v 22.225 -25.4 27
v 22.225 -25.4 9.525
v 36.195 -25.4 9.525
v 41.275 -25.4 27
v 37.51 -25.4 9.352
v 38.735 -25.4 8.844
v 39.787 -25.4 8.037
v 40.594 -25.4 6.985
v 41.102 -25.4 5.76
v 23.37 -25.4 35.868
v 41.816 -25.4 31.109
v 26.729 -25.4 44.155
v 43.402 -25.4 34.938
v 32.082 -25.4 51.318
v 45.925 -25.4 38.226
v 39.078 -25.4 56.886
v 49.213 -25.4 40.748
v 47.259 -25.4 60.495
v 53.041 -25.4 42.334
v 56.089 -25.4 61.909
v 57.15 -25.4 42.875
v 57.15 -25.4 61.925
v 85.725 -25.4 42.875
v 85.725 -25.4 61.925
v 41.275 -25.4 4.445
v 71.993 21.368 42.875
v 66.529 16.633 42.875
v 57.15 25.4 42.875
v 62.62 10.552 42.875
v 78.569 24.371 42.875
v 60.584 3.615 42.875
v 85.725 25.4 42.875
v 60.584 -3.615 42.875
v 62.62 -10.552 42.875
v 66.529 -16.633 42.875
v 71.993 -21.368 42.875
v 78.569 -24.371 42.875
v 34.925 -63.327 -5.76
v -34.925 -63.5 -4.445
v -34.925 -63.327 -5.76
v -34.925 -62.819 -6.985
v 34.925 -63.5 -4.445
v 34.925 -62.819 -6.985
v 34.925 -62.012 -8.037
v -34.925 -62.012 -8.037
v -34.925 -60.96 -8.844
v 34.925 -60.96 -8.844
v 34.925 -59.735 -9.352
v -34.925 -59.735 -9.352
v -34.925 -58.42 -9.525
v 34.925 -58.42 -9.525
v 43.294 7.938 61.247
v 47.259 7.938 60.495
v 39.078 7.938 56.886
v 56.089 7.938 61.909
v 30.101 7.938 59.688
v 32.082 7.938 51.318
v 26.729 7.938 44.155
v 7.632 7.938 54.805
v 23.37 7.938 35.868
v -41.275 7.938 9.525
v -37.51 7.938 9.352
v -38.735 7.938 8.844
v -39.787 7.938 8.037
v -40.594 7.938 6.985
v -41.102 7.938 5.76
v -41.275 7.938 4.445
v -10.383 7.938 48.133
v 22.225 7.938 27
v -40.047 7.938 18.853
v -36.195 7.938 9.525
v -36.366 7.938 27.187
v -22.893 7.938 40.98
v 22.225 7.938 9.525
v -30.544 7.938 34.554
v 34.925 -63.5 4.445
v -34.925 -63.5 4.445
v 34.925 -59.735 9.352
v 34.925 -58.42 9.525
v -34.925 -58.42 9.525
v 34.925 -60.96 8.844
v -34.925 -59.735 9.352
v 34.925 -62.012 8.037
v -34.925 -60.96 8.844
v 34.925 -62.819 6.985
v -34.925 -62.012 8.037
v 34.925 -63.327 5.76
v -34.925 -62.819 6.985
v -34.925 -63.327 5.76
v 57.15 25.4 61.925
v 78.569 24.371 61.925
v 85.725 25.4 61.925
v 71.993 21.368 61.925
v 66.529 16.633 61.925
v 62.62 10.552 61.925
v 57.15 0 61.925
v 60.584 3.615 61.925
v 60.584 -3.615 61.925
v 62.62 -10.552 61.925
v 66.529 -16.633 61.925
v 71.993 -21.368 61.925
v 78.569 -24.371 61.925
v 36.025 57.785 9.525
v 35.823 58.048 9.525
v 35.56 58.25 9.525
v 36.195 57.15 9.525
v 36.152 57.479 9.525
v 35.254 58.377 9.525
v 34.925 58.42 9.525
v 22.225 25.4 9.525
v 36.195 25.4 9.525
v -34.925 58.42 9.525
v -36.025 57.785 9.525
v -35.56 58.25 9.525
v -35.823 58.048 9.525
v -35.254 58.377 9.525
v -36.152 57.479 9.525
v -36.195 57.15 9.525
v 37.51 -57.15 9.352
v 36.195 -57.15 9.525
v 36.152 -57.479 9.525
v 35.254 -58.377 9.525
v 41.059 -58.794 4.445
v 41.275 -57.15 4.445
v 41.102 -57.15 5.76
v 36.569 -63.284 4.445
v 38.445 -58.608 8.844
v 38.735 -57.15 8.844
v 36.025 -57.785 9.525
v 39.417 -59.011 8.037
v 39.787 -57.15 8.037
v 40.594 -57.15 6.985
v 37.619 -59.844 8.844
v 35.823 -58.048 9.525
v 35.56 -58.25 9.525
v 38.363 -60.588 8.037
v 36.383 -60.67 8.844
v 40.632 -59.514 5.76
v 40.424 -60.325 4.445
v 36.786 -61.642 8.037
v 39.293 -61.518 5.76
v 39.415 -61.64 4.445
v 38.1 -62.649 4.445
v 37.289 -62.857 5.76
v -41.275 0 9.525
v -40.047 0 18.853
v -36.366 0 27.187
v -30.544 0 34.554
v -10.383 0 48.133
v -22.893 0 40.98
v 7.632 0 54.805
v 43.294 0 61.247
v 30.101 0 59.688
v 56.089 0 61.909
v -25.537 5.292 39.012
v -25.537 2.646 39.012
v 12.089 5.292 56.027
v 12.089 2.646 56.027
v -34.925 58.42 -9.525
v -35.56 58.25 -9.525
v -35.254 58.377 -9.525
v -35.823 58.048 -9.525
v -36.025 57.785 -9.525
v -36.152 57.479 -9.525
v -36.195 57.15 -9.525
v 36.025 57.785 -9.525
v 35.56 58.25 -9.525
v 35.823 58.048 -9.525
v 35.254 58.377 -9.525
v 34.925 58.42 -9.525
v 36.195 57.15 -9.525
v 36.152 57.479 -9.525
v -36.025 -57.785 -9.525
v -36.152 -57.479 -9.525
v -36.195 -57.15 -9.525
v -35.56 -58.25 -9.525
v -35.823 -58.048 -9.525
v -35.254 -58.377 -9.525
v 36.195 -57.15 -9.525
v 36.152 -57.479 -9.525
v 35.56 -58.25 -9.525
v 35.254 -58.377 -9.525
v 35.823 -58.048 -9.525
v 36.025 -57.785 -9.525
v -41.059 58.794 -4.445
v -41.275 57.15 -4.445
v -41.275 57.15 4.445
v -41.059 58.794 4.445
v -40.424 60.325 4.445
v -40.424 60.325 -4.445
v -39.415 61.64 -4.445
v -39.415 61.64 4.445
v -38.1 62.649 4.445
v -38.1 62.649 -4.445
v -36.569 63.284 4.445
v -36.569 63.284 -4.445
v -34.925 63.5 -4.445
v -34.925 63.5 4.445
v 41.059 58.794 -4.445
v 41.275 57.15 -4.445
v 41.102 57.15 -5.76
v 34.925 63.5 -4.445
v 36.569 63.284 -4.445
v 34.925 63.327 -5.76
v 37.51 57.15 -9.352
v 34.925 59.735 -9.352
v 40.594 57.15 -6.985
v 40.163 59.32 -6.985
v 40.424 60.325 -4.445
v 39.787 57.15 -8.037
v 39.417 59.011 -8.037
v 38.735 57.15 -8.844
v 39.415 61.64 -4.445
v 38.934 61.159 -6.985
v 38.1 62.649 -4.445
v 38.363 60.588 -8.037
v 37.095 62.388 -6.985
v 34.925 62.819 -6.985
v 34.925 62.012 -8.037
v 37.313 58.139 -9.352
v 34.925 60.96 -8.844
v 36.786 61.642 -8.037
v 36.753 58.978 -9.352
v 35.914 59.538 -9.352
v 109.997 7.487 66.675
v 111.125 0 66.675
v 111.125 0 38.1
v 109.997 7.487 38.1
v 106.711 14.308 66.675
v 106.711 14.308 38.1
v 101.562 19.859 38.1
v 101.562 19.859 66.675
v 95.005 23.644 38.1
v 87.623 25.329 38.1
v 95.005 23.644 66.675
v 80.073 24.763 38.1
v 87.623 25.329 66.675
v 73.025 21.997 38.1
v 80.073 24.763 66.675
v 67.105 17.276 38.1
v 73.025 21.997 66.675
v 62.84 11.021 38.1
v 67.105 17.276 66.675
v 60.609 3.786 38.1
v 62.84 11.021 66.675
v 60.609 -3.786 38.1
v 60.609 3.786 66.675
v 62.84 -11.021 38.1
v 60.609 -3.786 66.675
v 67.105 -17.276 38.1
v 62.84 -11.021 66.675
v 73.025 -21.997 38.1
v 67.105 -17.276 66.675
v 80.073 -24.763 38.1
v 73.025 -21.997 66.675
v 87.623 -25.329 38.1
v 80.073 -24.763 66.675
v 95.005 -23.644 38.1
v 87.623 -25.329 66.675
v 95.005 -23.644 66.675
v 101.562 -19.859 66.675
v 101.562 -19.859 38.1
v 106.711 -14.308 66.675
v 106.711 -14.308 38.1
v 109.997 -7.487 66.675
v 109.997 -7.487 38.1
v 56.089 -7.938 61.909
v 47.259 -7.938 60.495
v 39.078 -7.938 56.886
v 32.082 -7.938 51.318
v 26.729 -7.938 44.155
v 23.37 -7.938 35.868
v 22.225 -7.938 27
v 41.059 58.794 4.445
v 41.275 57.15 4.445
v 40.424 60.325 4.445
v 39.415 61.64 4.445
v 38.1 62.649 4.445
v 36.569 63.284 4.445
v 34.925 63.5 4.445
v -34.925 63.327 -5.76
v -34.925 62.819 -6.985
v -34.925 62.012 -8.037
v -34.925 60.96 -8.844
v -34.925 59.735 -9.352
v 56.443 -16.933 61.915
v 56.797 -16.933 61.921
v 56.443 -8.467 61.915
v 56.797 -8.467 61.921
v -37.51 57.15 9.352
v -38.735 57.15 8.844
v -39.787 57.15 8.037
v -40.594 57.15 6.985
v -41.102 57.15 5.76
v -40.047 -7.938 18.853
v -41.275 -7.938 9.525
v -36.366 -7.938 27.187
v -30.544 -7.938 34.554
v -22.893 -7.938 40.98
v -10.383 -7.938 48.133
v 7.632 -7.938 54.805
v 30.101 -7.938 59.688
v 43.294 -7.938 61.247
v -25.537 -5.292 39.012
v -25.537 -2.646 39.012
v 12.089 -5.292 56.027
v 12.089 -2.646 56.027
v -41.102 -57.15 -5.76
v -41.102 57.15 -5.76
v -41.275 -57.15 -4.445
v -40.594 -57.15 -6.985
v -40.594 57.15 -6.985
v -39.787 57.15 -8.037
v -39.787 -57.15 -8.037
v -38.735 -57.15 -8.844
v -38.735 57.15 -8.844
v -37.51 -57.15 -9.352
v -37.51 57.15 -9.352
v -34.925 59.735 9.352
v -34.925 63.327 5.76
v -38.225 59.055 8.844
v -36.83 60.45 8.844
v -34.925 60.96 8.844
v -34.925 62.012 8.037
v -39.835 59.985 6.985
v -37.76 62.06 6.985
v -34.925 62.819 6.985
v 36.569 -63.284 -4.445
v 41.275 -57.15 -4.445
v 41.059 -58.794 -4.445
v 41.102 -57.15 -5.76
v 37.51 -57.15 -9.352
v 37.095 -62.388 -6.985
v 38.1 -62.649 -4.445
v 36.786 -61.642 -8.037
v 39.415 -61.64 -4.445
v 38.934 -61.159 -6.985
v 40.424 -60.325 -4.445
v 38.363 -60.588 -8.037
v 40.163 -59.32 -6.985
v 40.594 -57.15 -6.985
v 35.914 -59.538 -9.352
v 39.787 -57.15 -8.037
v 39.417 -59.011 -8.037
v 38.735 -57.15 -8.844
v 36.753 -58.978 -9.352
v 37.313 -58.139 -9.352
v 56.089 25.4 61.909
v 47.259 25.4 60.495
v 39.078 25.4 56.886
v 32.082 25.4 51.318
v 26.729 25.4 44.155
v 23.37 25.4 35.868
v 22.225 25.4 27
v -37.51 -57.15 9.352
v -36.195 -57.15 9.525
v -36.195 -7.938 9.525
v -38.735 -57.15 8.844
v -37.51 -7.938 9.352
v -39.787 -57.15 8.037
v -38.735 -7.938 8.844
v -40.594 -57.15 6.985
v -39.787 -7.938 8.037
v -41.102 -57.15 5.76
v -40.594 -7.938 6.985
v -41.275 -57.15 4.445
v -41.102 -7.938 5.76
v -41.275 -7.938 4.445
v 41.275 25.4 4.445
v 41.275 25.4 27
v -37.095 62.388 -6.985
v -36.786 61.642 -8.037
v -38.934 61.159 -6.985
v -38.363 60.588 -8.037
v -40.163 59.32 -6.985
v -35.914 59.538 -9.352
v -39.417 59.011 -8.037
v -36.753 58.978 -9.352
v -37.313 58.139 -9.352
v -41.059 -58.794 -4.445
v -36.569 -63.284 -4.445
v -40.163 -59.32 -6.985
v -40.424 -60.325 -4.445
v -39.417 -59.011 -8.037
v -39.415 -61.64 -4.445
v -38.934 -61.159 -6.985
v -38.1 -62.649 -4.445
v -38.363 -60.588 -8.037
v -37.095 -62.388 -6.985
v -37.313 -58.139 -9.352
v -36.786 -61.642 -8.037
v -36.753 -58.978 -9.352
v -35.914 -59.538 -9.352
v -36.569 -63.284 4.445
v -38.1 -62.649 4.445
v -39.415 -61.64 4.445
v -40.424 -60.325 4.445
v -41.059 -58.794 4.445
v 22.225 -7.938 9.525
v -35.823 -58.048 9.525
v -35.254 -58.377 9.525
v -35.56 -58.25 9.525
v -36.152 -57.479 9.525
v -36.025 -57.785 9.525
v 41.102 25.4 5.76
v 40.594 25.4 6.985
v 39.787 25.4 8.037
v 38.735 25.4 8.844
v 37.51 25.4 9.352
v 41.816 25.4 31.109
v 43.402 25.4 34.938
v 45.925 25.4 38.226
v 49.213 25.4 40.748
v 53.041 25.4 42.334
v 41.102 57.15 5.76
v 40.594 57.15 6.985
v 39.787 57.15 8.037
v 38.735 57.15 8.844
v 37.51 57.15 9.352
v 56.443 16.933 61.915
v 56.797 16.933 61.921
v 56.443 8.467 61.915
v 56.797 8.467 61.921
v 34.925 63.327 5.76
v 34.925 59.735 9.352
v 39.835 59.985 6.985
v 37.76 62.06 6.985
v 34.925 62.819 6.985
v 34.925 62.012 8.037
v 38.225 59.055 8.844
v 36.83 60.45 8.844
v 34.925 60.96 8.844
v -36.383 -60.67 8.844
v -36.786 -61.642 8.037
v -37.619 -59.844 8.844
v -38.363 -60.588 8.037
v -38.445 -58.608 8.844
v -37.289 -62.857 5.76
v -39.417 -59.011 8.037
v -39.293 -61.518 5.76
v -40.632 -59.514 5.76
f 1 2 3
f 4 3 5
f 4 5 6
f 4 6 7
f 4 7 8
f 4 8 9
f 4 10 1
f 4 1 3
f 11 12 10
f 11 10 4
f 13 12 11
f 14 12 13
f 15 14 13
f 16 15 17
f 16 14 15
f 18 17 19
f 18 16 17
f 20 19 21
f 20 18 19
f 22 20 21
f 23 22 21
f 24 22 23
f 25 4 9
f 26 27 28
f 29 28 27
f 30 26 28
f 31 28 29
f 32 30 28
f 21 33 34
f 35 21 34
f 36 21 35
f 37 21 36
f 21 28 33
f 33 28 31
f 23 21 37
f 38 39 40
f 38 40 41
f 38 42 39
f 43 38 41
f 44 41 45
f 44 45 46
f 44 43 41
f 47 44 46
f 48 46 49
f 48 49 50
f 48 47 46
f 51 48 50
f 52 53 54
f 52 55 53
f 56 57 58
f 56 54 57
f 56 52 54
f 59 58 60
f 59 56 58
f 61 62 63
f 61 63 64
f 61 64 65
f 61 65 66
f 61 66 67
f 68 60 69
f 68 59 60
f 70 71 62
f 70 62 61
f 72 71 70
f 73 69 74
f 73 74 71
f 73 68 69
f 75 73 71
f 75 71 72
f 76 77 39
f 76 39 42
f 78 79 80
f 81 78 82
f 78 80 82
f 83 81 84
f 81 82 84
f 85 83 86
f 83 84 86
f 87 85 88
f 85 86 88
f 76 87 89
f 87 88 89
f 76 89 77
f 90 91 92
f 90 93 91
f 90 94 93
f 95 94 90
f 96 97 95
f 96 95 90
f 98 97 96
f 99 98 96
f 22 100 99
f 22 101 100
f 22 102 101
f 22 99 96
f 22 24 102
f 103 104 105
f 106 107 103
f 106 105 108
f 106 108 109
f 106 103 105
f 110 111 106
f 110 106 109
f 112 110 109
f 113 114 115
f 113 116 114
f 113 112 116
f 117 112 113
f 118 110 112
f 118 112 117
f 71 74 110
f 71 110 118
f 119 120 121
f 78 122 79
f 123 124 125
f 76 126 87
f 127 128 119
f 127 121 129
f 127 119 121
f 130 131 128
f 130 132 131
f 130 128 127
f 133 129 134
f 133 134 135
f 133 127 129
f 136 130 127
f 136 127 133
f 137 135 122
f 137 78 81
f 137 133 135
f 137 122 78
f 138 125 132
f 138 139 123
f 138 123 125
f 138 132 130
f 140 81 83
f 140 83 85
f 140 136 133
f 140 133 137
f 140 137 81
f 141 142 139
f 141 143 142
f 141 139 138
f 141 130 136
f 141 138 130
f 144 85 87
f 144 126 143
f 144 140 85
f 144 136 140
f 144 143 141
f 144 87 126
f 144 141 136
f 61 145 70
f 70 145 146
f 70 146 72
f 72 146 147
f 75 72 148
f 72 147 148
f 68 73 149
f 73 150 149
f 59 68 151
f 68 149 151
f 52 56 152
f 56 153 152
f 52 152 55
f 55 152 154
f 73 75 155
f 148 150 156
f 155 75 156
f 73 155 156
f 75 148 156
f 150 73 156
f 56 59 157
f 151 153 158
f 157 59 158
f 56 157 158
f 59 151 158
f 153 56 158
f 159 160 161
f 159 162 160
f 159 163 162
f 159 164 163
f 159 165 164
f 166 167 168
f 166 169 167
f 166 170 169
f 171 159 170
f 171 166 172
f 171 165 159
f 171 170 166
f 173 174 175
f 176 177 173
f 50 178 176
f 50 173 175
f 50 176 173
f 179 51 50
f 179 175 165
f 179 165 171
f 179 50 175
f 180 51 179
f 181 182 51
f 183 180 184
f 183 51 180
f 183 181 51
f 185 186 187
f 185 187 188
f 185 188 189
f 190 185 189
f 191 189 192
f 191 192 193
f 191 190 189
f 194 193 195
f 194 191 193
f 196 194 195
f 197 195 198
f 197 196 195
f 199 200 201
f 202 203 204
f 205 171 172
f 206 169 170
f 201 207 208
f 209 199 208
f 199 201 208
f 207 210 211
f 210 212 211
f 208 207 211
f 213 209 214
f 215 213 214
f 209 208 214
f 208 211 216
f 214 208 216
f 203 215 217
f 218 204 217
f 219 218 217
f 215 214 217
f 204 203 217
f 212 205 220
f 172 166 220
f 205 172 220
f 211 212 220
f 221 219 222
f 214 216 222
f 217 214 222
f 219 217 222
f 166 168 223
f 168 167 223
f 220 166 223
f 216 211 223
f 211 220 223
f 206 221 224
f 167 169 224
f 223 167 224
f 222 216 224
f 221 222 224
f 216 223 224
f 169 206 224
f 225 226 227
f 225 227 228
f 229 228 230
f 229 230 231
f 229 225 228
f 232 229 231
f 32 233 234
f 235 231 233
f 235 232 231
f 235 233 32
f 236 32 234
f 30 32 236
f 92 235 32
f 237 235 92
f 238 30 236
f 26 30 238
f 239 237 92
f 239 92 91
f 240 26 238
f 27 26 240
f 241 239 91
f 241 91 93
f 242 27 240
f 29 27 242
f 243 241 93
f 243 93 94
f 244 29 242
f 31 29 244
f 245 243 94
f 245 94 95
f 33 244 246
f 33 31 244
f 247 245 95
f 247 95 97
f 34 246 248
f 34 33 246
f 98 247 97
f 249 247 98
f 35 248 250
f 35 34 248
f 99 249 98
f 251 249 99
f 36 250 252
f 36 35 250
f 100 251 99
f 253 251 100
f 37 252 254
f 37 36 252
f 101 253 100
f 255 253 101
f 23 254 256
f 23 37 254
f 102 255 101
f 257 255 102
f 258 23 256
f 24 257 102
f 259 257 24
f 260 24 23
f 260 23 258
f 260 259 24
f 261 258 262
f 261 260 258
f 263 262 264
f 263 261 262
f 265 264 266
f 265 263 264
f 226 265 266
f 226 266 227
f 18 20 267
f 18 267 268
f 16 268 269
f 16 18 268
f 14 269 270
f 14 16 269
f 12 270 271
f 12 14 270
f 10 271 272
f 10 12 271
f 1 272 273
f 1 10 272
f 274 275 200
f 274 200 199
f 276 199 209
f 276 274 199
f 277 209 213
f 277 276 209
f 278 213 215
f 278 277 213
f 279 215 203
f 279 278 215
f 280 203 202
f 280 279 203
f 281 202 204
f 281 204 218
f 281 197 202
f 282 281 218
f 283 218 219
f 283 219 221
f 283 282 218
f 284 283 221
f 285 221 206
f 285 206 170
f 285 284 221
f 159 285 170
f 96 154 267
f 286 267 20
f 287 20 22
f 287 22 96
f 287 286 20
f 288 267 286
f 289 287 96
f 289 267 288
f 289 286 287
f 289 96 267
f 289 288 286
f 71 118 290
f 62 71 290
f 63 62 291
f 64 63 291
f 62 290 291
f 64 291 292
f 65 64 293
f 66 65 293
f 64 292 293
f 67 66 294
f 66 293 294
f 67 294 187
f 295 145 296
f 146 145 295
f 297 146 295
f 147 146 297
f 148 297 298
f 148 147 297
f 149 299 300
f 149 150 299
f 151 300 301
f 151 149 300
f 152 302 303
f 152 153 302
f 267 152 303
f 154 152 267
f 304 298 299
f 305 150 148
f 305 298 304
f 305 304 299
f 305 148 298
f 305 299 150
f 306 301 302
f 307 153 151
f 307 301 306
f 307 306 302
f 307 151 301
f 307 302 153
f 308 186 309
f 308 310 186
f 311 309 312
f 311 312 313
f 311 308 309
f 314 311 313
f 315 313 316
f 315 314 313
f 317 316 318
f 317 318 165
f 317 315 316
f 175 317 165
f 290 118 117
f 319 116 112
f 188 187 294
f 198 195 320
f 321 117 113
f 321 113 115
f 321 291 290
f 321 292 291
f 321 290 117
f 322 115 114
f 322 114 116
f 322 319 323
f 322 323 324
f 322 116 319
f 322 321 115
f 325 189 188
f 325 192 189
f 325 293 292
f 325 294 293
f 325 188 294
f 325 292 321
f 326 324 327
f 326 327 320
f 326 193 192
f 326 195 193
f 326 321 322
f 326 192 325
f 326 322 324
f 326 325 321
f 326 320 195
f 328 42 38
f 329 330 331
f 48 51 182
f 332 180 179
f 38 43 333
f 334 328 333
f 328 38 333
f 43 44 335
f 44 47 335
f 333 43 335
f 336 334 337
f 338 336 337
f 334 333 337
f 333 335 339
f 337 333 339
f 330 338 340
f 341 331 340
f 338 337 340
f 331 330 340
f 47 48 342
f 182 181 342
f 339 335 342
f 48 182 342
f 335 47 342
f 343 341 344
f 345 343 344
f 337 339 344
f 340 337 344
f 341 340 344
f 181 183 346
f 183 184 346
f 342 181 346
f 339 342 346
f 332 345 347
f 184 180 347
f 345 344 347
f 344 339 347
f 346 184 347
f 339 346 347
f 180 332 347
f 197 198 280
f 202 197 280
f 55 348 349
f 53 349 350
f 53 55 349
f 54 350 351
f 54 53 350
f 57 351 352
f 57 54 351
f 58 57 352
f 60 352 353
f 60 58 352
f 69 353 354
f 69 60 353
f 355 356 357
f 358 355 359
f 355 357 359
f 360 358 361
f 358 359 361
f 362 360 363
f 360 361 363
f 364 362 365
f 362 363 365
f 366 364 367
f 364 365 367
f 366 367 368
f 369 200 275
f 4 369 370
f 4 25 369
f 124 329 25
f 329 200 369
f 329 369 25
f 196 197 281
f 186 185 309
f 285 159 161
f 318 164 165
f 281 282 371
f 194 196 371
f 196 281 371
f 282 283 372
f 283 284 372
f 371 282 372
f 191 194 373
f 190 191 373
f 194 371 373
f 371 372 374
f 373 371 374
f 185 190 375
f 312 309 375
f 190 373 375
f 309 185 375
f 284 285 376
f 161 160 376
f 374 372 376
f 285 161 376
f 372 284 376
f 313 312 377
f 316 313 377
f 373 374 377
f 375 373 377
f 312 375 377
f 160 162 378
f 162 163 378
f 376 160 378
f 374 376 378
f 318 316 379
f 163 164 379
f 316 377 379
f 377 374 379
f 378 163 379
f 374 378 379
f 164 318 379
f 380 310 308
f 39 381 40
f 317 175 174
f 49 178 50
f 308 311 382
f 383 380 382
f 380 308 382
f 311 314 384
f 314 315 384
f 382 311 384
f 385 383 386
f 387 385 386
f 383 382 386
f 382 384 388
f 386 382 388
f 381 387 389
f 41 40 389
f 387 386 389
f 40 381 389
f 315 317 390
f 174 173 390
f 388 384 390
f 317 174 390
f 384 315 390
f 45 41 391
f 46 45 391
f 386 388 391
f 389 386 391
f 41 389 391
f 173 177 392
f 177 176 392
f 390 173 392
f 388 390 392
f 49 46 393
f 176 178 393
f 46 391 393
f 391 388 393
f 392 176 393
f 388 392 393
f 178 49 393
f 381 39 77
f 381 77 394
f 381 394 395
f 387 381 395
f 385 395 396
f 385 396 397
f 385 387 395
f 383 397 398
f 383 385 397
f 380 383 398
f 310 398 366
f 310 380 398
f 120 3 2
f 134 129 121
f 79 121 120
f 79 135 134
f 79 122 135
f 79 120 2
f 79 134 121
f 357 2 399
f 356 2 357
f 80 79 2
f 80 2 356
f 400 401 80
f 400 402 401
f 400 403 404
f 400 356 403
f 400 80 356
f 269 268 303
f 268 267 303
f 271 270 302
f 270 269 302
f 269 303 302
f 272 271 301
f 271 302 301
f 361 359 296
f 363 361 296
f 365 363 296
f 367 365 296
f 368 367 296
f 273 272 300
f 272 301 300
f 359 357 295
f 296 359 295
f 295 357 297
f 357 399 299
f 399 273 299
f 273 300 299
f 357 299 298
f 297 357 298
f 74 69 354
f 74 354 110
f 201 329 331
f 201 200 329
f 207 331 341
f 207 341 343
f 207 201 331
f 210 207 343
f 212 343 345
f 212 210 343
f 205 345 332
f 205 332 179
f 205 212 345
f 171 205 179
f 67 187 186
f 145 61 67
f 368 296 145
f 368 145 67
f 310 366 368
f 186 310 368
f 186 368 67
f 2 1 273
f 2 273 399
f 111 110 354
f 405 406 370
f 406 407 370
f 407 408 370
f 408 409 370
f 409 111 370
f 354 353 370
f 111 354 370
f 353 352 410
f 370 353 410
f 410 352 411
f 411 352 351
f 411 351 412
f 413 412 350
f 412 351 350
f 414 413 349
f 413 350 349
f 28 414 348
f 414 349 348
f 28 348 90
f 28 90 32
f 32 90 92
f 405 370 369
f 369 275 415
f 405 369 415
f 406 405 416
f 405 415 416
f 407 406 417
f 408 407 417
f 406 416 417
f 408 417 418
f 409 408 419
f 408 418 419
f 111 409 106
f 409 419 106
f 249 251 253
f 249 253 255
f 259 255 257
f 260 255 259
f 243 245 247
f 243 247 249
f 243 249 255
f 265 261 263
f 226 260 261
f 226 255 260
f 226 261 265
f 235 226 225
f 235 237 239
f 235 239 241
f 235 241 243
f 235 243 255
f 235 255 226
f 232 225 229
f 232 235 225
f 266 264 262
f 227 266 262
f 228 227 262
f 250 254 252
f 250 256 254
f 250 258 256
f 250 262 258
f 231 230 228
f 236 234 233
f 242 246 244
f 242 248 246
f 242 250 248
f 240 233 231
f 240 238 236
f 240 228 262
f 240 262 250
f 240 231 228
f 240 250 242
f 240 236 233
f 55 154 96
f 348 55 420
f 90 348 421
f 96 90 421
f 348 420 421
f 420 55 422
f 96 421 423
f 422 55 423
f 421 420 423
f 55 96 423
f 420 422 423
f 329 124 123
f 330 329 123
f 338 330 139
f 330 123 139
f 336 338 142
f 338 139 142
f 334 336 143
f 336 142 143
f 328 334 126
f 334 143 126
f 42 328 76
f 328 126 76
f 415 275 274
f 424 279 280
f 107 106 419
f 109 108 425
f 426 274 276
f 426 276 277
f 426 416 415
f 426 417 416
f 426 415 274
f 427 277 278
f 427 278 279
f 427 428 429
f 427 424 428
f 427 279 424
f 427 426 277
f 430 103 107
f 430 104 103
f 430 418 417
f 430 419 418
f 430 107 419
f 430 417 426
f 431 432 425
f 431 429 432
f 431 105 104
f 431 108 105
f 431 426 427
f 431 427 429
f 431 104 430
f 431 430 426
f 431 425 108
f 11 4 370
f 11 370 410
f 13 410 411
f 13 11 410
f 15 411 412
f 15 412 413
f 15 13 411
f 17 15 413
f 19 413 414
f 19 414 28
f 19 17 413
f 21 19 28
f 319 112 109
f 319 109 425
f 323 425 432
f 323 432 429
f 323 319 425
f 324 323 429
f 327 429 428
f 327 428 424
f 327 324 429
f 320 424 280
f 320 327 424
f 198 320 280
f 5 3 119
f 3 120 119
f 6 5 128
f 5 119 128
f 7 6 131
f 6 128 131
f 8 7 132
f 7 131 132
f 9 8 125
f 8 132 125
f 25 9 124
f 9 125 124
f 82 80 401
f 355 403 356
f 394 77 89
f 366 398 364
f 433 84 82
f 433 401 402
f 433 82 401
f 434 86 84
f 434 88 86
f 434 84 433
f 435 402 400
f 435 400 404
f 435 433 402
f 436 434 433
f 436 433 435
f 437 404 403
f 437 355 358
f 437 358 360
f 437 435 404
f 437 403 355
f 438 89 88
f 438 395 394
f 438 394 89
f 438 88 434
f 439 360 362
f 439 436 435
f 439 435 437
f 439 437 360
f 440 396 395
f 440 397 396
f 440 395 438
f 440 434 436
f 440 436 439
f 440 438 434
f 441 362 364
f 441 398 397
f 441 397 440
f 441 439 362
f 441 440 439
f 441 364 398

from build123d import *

# Parameters (mm, degrees)
F1_DEPTH     = 63.5
F0_W         = 25.4
F0_H         = 19.05
F2_DEPTH     = 25.4
F3_DEPTH     = 7.9375
F5_R         = 6.35
F6_R         = 5.08
F7_T1_DEPTH  = 69.85
F7_T3_DEPTH  = 49.2125
F7_T5_DEPTH  = 31.75
F7_T8_ANGLE  = 90
F7_T10_ANGLE = 90
F8_R         = 5.08


# Not quite as in the source:
# - a fillet or chamfer that OpenCascade refuses, or shapes differently, is made with other operations: its cross-section is extruded or revolved along the edge and cut away or added


with BuildPart() as f1:
    # F0 (on Front) → F1 (new body, symmetric)
    with BuildSketch(Plane.XZ):
        Polygon((22.225, 9.525), (-41.275, 9.525), (-41.275, -9.525), (41.275, -9.525), (41.275, 9.525), align=None)
    extrude(amount=F1_DEPTH, both=True)

    # F0 (on Front) → F2 (join, symmetric)
    with BuildSketch(Plane.XZ):
        with BuildLine():
            Line((22.225, 27.0002), (22.225, 9.525))
            Line((22.225, 9.525), (41.275, 9.525))
            Line((41.275, 9.525), (41.275, 27.0002))
            ThreePointArc((41.275, 27.0002), (45.9246798487, 38.2255201513), (57.15, 42.8752))
            Line((57.15, 42.8752), (60.325, 42.8752))
            Line((60.325, 42.8752), (60.325, 61.9252))
            Line((60.325, 61.9252), (57.15, 61.9252))
            add(Edge.make_bspline(
                [(56.0885572702, 61.9090665575), (56.4433633619, 61.9154910812), (56.7971916203, 61.9208676872), (57.15, 61.9252)],
                knots=[110.5707934898, 110.5707934898, 110.5707934898, 110.5707934898, 111.5045361635, 111.5045361635, 111.5045361635, 111.5045361635], degree=3))
            ThreePointArc((56.0885572702, 61.9090665575), (32.0818278255, 51.3177321287), (22.225, 27.0002))
        make_face()
        with Locations((73.025, 52.4002)):
            Rectangle(F0_W, F0_H)
    extrude(amount=F2_DEPTH, both=True)

    # F0 (on Front) → F3 (join, symmetric)
    with BuildSketch(Plane.XZ):
        with BuildLine():
            add(Edge.make_bspline(
                [(-41.275, 9.525), (-41.6531258736, 45.6930648181), (14.073565129, 61.1482951996), (56.0885572702, 61.9090665575)],
                knots=[0, 0, 0, 0, 110.5707934898, 110.5707934898, 110.5707934898, 110.5707934898], degree=3))
            Line((-41.275, 9.525), (22.225, 9.525))
            Line((22.225, 9.525), (22.225, 27.0002))
            ThreePointArc((22.225, 27.0002), (32.0818278255, 51.3177321287), (56.0885572702, 61.9090665575))
        make_face()
    extrude(amount=F3_DEPTH, both=True)

    # F0 (on Front) → F4 (revolve)
    with BuildSketch(Plane.XZ):
        Polygon((85.725, 66.675), (85.725, 61.9252), (85.725, 42.8752), (85.725, 38.1), (111.125, 38.1), (111.125, 66.675), align=None)
    revolve(axis=Axis((85.725, 0, 52.3875), (0, 0, 1)))

    # F5
    f5_edges = [f1.edges().sort_by_distance(p)[0] for p in [
        (-41.275, -63.5, 0),
        (41.275, -63.5, 0),
        (41.275, 63.5, 0),
        (-41.275, 63.5, 0),
    ]]
    fillet(f5_edges, radius=F5_R)

    # F6
    f6_edges = [f1.edges().sort_by_distance(p)[0] for p in [
        (0, -63.5, -9.525),
    ]]
    fillet(f6_edges, radius=F6_R)

    # F7: fillet of radius 5.08 on 1 edges, made by hand

    # F7_s2 → F7_t1 (cut)
    with BuildSketch(Plane.YZ.offset(-34.925)):
        with BuildLine():
            ThreePointArc((58.42, 9.525), (62.0121024484, 8.0371024484), (63.5, 4.445))
            Line((63.5, 4.445), (63.5, 9.525))
            Line((63.5, 9.525), (58.42, 9.525))
        make_face()
    extrude(amount=F7_T1_DEPTH, mode=Mode.SUBTRACT)

    # F7_s4 → F7_t3 (cut)
    with BuildSketch(Plane.XZ.offset(-57.15)):
        with BuildLine():
            ThreePointArc((-36.195, 9.525), (-39.7871024484, 8.0371024484), (-41.275, 4.445))
            Line((-41.275, 4.445), (-41.275, 9.525))
            Line((-41.275, 9.525), (-36.195, 9.525))
        make_face()
    extrude(amount=F7_T3_DEPTH, mode=Mode.SUBTRACT)

    # F7_s6 → F7_t5 (cut)
    with BuildSketch(Plane.XZ.offset(-57.15)):
        with BuildLine():
            ThreePointArc((41.275, 4.445), (39.7871024484, 8.0371024484), (36.195, 9.525))
            Line((36.195, 9.525), (41.275, 9.525))
            Line((41.275, 9.525), (41.275, 4.445))
        make_face()
    extrude(amount=F7_T5_DEPTH, mode=Mode.SUBTRACT)

    # F7_s7 → F7_t8 (revolve, cut)
    with BuildSketch(Plane.XZ.offset(-57.15)):
        with BuildLine():
            ThreePointArc((41.275, 4.445), (39.7871024484, 8.0371024484), (36.195, 9.525))
            Line((36.195, 9.525), (41.275, 9.525))
            Line((41.275, 9.525), (41.275, 4.445))
        make_face()
    revolve(axis=Axis((34.925, 57.15, 9.525), (0, 0, 1)), revolution_arc=F7_T8_ANGLE, mode=Mode.SUBTRACT)

    # F7_s9 → F7_t10 (revolve, cut)
    with BuildSketch(Plane.XZ.offset(-57.15)):
        with BuildLine():
            ThreePointArc((-36.195, 9.525), (-39.7871024484, 8.0371024484), (-41.275, 4.445))
            Line((-41.275, 4.445), (-41.275, 9.525))
            Line((-41.275, 9.525), (-36.195, 9.525))
        make_face()
    revolve(axis=Axis((-34.925, 57.15, 9.525), (0, 0, -1)), revolution_arc=F7_T10_ANGLE, mode=Mode.SUBTRACT)

    # F8
    f8_edges = [f1.edges().sort_by_distance(p)[0] for p in [
        (0, -63.5, 9.525),
        (41.275, -41.275, 9.525),
        (39.415128, -61.640128, 9.525),
        (-39.415128, -61.640128, 9.525),
        (-41.275, -32.54375, 9.525),
    ]]
    fillet(f8_edges, radius=F8_R)


solid = f1.part
